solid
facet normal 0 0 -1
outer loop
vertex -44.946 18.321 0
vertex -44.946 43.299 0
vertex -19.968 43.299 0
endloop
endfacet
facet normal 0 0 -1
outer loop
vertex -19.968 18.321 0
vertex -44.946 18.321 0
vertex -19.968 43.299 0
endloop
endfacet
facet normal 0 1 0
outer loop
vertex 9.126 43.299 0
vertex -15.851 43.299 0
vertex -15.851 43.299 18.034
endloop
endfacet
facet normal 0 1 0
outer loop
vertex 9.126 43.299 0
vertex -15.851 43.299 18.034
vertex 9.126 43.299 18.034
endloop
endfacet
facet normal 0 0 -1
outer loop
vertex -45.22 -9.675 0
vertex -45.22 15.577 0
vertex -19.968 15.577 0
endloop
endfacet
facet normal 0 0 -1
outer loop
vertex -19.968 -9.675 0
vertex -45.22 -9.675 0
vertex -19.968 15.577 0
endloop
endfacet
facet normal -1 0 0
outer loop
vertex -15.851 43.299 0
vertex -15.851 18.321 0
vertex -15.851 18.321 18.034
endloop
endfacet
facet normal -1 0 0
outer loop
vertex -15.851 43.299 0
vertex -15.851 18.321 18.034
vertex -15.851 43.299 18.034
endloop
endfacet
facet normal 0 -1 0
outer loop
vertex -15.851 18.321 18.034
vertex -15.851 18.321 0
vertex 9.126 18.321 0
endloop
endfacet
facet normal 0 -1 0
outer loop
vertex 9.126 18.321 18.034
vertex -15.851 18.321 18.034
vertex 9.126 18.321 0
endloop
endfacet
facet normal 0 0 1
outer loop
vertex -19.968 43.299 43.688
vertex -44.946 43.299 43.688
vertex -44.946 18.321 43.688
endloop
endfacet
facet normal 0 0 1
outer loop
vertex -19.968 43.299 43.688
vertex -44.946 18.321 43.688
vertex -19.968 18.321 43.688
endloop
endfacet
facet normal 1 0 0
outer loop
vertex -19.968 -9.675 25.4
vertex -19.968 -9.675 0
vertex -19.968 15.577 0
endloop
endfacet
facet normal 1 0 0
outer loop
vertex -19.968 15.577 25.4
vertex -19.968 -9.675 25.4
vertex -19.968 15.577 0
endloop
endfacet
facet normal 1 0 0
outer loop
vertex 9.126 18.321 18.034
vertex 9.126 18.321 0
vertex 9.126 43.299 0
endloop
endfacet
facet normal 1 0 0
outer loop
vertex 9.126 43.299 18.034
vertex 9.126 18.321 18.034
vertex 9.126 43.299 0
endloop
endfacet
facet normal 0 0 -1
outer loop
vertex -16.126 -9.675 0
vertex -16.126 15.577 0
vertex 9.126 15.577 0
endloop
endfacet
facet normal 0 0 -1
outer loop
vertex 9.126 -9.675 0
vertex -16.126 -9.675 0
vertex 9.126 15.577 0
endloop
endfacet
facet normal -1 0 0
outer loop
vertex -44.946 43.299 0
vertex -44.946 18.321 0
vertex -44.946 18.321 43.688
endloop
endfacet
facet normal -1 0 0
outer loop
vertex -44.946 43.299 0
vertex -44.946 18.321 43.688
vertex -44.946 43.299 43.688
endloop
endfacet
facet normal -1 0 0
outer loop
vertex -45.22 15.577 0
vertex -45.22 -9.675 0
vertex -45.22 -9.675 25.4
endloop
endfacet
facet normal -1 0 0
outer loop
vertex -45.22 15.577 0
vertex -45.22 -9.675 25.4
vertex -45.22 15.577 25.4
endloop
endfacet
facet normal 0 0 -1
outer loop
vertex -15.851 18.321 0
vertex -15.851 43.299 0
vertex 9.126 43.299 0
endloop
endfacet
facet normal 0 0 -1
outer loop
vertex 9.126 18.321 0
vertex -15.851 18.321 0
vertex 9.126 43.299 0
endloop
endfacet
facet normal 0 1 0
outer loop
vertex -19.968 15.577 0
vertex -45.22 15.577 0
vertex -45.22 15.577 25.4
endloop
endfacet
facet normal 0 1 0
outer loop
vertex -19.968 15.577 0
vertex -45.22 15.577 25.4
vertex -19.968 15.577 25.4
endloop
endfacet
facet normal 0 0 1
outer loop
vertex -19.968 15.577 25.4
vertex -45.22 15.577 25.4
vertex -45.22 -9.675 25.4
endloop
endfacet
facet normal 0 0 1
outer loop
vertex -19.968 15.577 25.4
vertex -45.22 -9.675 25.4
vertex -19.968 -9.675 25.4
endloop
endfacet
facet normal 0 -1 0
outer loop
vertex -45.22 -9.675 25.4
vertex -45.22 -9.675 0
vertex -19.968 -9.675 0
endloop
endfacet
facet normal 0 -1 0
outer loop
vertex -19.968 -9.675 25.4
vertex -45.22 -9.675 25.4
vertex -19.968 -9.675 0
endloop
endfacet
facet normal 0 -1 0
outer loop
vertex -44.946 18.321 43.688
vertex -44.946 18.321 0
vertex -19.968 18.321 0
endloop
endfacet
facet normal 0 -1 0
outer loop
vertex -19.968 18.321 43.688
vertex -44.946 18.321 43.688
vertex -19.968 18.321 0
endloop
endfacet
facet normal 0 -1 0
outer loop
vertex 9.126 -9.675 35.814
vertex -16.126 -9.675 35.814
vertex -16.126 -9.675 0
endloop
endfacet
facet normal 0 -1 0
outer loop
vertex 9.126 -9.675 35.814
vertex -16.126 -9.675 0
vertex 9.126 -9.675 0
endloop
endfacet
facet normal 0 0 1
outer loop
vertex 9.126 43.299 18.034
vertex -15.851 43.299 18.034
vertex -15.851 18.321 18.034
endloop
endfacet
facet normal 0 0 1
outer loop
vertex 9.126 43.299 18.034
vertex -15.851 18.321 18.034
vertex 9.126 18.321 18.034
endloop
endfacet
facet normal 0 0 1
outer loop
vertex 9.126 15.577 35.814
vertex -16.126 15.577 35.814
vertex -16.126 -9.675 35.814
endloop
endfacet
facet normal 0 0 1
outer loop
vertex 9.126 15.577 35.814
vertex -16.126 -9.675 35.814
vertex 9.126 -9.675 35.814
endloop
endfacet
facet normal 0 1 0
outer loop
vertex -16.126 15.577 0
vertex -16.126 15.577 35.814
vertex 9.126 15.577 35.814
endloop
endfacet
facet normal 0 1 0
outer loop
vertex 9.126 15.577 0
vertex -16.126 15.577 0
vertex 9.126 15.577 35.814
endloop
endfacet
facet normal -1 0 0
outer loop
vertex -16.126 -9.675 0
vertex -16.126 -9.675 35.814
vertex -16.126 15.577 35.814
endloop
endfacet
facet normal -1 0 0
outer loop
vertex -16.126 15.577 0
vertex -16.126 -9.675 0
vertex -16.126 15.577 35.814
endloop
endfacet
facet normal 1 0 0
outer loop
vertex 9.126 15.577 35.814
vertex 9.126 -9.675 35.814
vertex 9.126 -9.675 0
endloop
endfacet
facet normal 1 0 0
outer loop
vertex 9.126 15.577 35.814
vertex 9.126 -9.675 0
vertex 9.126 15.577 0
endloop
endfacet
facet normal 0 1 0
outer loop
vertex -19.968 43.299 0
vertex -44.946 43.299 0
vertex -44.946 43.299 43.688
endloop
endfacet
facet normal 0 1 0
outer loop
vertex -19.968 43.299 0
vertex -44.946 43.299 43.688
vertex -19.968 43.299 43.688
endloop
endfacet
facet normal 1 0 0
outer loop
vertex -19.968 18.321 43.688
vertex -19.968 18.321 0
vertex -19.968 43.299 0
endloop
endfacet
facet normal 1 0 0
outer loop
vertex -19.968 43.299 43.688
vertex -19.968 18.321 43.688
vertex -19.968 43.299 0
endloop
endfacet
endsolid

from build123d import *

# Parameters (mm, degrees)
F0_W     = 24.977392
F0_H     = 24.977391
F1_DEPTH = 18.034
F2_DEPTH = 43.688
F0_W_2   = 25.251871
F0_H_2   = 25.251871
F3_DEPTH = 25.4
F0_W_3   = 25.251869
F0_H_3   = 25.251869
F4_DEPTH = 35.814


with BuildPart() as f1:
    # F0 (on Top) → F1 (new body)
    with BuildSketch(Plane.XY):
        with Locations((-3.362342, 30.810026)):
            Rectangle(F0_W, F0_H)
    extrude(amount=F1_DEPTH)


with BuildPart() as f2:
    # F0 (on Top) → F2 (new body)
    with BuildSketch(Plane.XY):
        with Locations((-32.456887, 30.810026)):
            Rectangle(F0_W, F0_H)
    extrude(amount=F2_DEPTH)

    # F0 (on Top) → F3 (join)
    with BuildSketch(Plane.XY):
        with Locations((-32.456887, 30.810026)):
            Rectangle(F0_W, F0_H)
        with Locations((-32.594127, 2.950626)):
            Rectangle(F0_W_2, F0_H_2)
    extrude(amount=F3_DEPTH)


with BuildPart() as f4:
    # F0 (on Top) → F4 (new body)
    with BuildSketch(Plane.XY):
        with Locations((-3.499581, 2.950627)):
            Rectangle(F0_W_3, F0_H_3)
    extrude(amount=F4_DEPTH)


solid = Compound([f1.part, f2.part, f4.part])
